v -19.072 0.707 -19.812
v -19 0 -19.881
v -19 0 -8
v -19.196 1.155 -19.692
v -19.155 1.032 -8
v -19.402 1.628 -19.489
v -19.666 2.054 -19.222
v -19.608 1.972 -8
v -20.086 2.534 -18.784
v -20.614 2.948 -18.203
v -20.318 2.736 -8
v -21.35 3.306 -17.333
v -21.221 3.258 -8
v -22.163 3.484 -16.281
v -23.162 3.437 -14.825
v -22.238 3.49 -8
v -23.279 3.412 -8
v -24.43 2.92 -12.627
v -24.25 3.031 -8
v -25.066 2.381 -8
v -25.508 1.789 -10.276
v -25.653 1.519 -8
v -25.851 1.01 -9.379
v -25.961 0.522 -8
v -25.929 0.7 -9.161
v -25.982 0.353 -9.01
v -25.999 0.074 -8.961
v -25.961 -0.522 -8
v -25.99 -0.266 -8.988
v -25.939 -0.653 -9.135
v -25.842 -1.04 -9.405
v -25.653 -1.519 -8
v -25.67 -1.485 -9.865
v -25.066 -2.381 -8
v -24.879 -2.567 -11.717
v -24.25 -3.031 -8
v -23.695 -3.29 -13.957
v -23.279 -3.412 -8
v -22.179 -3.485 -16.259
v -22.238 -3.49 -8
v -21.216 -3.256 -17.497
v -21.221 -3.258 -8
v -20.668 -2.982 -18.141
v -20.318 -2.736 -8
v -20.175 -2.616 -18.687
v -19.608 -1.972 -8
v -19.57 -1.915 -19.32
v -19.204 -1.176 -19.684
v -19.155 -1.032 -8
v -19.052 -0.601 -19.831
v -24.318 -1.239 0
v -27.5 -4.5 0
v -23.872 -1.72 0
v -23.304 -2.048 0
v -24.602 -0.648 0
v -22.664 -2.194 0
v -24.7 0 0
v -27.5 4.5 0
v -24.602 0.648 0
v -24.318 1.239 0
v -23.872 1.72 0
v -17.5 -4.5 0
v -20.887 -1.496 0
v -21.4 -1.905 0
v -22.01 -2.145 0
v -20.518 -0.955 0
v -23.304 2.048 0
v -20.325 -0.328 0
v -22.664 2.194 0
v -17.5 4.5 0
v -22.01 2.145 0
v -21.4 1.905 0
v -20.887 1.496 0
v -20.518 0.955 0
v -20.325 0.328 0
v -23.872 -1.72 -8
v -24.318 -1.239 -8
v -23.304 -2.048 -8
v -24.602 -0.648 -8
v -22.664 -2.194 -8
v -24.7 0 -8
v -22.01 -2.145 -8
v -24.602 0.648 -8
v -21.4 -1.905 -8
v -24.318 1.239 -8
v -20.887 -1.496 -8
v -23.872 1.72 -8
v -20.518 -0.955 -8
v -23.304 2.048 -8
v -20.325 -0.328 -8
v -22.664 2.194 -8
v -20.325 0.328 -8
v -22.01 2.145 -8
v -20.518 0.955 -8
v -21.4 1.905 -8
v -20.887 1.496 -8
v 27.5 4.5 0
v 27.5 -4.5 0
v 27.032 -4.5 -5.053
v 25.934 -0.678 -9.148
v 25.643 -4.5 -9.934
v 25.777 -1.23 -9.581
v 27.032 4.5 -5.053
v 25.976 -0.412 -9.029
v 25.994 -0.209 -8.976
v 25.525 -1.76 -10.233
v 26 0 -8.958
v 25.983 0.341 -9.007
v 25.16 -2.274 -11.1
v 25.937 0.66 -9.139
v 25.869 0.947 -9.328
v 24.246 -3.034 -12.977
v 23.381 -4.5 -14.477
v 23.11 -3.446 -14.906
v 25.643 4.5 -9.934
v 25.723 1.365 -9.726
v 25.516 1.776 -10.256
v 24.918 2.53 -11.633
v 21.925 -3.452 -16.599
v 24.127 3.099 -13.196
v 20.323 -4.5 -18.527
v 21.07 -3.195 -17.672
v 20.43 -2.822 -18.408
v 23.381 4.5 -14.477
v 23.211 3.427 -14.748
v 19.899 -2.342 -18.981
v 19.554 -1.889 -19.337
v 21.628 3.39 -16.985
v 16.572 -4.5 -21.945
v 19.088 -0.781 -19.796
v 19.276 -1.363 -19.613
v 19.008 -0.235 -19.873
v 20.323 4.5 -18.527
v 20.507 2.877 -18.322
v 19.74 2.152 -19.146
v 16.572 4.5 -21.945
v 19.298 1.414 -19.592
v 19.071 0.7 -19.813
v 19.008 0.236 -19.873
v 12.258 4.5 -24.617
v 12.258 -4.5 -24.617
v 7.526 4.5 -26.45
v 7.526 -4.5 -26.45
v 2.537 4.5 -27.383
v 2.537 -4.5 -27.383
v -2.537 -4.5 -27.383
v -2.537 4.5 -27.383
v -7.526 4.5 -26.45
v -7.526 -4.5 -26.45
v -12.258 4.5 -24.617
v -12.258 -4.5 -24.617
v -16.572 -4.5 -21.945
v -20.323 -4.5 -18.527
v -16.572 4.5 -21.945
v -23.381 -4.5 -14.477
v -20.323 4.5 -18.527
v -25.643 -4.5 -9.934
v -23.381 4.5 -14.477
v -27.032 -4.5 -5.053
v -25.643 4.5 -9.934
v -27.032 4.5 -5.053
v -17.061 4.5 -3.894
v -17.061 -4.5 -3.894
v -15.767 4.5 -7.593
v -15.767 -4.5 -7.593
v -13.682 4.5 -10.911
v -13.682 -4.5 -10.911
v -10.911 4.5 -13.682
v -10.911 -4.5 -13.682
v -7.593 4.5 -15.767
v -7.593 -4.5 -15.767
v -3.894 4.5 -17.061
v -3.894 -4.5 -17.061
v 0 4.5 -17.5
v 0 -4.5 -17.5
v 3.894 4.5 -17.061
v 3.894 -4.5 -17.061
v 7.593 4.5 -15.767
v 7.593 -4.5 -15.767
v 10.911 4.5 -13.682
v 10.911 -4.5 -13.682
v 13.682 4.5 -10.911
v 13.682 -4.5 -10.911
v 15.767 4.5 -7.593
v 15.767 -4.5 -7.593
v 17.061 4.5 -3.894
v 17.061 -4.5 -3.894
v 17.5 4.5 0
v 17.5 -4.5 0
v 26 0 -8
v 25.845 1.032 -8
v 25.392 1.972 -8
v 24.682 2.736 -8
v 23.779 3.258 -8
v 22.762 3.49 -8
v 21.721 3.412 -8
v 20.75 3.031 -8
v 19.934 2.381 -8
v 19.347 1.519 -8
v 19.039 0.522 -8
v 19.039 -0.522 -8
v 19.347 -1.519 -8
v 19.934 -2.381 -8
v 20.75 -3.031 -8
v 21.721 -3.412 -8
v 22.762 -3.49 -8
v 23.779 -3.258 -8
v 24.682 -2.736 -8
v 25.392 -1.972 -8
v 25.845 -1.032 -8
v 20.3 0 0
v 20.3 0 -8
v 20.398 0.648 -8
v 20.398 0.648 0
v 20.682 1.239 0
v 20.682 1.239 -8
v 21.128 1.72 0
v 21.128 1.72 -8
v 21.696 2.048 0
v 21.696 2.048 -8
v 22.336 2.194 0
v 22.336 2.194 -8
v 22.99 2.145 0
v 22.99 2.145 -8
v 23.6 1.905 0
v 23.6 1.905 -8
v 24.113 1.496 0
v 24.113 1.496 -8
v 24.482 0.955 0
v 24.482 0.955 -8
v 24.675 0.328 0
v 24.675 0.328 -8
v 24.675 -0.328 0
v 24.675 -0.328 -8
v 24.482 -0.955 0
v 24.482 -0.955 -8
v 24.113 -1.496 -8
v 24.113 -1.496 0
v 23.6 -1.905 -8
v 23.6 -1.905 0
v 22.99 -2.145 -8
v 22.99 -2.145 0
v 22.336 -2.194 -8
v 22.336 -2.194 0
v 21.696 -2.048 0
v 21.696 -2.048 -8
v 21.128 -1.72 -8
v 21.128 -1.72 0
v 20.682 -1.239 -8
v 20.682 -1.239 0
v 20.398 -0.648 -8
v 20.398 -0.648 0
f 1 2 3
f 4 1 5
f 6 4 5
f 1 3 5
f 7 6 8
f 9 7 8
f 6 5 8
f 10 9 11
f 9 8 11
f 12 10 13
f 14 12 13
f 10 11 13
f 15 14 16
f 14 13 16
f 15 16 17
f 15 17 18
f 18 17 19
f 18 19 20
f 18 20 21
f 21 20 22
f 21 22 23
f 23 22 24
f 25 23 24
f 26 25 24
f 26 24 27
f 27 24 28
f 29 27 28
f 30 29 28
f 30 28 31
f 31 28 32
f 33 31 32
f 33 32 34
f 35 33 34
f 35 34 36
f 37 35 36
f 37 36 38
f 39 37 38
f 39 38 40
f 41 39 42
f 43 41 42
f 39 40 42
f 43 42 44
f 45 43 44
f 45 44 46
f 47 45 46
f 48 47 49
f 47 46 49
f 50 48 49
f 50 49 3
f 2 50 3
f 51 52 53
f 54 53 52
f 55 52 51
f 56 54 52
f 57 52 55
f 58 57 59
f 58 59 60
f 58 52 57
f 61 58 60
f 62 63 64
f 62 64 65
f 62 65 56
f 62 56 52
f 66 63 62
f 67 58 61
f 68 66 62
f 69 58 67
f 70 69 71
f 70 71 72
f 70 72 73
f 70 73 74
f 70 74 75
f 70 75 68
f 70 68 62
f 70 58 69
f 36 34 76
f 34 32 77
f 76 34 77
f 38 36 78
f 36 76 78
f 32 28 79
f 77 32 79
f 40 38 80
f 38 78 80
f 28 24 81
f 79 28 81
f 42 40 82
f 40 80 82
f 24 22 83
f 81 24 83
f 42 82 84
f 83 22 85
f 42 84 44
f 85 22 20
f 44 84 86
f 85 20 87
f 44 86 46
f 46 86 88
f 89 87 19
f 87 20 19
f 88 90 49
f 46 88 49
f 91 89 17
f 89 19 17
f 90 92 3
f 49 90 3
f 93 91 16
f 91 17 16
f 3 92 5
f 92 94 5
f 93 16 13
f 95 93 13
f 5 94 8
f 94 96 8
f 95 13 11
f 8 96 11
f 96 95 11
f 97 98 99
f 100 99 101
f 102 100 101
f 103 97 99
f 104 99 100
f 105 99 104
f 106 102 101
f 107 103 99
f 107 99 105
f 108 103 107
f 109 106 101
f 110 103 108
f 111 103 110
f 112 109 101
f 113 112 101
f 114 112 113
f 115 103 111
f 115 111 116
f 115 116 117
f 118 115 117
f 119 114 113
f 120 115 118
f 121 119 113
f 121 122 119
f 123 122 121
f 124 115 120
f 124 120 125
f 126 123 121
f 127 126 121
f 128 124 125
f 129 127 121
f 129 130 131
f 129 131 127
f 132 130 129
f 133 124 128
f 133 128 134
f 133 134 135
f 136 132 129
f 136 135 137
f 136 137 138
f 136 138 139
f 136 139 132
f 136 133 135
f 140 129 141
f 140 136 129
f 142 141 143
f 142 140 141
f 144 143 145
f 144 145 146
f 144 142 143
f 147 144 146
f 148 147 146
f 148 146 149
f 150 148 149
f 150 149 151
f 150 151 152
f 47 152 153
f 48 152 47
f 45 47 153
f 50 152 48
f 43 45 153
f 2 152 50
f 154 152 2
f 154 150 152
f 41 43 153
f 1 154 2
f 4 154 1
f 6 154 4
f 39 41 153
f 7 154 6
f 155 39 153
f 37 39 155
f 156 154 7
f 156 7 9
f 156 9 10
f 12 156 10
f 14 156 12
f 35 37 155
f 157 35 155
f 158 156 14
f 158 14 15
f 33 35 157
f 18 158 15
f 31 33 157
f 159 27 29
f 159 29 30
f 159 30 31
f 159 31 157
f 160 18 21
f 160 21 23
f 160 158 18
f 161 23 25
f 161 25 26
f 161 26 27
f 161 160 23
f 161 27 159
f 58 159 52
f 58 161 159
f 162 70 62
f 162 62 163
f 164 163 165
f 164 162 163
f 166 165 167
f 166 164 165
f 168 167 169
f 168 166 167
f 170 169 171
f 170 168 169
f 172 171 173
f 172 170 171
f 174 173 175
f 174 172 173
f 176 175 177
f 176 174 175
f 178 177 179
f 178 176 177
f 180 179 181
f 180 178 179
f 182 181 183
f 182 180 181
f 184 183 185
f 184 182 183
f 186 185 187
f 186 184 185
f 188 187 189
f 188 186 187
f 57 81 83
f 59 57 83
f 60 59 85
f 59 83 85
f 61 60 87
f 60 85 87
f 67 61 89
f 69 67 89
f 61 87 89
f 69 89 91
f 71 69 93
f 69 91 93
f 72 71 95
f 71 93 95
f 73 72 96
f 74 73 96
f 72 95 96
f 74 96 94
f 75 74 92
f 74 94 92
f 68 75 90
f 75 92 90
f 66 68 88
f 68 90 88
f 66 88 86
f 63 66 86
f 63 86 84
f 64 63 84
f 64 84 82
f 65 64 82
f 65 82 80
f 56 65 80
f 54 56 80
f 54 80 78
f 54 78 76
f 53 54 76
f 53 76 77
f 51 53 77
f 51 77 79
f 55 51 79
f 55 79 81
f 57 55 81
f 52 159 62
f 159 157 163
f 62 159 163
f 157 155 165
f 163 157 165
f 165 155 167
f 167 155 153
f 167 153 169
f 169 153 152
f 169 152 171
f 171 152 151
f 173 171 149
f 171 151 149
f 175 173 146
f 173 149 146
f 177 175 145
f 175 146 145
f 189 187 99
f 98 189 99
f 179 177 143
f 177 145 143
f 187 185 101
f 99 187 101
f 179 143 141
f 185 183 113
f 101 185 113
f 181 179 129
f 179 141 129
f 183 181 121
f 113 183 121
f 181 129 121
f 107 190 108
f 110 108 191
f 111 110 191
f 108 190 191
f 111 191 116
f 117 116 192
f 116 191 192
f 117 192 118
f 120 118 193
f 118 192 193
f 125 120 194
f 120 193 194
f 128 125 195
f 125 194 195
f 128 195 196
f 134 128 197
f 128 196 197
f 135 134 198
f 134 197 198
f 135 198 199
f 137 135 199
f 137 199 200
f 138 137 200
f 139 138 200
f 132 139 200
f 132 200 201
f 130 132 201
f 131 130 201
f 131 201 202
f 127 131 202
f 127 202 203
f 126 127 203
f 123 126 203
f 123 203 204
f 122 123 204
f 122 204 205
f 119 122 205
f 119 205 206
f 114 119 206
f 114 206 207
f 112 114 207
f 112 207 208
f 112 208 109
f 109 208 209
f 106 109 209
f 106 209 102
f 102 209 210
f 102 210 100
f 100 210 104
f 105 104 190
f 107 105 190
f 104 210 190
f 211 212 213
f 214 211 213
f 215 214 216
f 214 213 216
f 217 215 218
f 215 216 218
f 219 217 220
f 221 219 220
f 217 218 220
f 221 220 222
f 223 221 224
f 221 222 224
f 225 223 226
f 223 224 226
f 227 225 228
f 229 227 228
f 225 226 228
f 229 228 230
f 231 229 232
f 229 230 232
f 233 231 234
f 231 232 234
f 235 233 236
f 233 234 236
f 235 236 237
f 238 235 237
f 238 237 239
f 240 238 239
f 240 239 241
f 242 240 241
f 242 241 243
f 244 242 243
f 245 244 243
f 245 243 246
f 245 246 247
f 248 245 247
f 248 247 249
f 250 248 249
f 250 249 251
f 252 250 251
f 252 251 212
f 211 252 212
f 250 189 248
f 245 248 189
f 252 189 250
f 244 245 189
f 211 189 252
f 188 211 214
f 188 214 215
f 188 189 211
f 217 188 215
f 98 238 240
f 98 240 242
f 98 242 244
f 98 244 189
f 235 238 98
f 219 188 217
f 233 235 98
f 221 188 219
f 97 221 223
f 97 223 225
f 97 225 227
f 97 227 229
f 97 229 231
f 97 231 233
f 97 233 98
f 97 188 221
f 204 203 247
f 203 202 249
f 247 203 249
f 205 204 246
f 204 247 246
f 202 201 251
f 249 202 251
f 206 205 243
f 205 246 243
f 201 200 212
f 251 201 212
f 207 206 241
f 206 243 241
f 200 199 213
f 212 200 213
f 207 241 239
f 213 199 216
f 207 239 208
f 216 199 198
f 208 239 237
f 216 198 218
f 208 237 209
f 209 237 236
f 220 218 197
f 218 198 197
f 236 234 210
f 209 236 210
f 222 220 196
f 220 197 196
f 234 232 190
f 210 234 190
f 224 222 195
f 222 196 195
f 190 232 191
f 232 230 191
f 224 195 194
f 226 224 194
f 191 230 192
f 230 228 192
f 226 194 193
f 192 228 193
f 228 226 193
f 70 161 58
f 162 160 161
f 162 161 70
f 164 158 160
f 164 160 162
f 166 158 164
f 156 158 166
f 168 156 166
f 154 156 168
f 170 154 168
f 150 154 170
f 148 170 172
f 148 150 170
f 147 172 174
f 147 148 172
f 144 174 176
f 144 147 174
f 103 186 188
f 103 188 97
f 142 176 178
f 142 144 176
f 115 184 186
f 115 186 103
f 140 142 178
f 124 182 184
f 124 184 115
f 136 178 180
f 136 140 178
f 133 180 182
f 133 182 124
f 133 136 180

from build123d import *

# Parameters (mm, degrees)
BOSS_EXTRUDE1_DEPTH        = 4.5
BOSS_EXTRUDE1_DEPTH_BACK   = 4.5
F_4_4_4_4_DIAMETER_HOLE1_D = 4.4
CUT_EXTRUDE1_START         = -8
SKETCH7_R                  = 3.5
CUT_EXTRUDE1_DEPTH         = 18


with BuildPart() as part:
    # Sketch1 → Boss-Extrude1 (new, two sides: drawn at the far end of the back side and taken through both)
    with BuildSketch(Plane(origin=(0, 0, 0), x_dir=(1, 0, 0), z_dir=(0, 1, 0)).offset(-BOSS_EXTRUDE1_DEPTH_BACK)):
        with BuildLine():
            Line((-27.5, 0), (-17.5, 0))
            ThreePointArc((-17.5, 0), (0, 17.5), (17.5, 0))
            Line((17.5, 0), (27.5, 0))
            ThreePointArc((27.5, 0), (0, 27.5), (-27.5, 0))
        make_face()
    extrude(amount=BOSS_EXTRUDE1_DEPTH + BOSS_EXTRUDE1_DEPTH_BACK)

    # Ø4.4 (4.4) Diameter Hole1 (through all)
    with Locations(Plane(origin=(22.5, 0, 0), x_dir=(1, 0, 0), z_dir=(0, 0, 1))):
        with Locations((0, 0), (-45, 0)):
            Hole(F_4_4_4_4_DIAMETER_HOLE1_D / 2)

    # Sketch7 → Cut-Extrude1 (cut)
    with BuildSketch(Plane.XY.offset(CUT_EXTRUDE1_START)):
        with Locations((-22.5, 0)):
            Circle(SKETCH7_R)
        with Locations((22.5, 0)):
            Circle(SKETCH7_R)
    extrude(amount=-CUT_EXTRUDE1_DEPTH, mode=Mode.SUBTRACT)


solid = part.part
